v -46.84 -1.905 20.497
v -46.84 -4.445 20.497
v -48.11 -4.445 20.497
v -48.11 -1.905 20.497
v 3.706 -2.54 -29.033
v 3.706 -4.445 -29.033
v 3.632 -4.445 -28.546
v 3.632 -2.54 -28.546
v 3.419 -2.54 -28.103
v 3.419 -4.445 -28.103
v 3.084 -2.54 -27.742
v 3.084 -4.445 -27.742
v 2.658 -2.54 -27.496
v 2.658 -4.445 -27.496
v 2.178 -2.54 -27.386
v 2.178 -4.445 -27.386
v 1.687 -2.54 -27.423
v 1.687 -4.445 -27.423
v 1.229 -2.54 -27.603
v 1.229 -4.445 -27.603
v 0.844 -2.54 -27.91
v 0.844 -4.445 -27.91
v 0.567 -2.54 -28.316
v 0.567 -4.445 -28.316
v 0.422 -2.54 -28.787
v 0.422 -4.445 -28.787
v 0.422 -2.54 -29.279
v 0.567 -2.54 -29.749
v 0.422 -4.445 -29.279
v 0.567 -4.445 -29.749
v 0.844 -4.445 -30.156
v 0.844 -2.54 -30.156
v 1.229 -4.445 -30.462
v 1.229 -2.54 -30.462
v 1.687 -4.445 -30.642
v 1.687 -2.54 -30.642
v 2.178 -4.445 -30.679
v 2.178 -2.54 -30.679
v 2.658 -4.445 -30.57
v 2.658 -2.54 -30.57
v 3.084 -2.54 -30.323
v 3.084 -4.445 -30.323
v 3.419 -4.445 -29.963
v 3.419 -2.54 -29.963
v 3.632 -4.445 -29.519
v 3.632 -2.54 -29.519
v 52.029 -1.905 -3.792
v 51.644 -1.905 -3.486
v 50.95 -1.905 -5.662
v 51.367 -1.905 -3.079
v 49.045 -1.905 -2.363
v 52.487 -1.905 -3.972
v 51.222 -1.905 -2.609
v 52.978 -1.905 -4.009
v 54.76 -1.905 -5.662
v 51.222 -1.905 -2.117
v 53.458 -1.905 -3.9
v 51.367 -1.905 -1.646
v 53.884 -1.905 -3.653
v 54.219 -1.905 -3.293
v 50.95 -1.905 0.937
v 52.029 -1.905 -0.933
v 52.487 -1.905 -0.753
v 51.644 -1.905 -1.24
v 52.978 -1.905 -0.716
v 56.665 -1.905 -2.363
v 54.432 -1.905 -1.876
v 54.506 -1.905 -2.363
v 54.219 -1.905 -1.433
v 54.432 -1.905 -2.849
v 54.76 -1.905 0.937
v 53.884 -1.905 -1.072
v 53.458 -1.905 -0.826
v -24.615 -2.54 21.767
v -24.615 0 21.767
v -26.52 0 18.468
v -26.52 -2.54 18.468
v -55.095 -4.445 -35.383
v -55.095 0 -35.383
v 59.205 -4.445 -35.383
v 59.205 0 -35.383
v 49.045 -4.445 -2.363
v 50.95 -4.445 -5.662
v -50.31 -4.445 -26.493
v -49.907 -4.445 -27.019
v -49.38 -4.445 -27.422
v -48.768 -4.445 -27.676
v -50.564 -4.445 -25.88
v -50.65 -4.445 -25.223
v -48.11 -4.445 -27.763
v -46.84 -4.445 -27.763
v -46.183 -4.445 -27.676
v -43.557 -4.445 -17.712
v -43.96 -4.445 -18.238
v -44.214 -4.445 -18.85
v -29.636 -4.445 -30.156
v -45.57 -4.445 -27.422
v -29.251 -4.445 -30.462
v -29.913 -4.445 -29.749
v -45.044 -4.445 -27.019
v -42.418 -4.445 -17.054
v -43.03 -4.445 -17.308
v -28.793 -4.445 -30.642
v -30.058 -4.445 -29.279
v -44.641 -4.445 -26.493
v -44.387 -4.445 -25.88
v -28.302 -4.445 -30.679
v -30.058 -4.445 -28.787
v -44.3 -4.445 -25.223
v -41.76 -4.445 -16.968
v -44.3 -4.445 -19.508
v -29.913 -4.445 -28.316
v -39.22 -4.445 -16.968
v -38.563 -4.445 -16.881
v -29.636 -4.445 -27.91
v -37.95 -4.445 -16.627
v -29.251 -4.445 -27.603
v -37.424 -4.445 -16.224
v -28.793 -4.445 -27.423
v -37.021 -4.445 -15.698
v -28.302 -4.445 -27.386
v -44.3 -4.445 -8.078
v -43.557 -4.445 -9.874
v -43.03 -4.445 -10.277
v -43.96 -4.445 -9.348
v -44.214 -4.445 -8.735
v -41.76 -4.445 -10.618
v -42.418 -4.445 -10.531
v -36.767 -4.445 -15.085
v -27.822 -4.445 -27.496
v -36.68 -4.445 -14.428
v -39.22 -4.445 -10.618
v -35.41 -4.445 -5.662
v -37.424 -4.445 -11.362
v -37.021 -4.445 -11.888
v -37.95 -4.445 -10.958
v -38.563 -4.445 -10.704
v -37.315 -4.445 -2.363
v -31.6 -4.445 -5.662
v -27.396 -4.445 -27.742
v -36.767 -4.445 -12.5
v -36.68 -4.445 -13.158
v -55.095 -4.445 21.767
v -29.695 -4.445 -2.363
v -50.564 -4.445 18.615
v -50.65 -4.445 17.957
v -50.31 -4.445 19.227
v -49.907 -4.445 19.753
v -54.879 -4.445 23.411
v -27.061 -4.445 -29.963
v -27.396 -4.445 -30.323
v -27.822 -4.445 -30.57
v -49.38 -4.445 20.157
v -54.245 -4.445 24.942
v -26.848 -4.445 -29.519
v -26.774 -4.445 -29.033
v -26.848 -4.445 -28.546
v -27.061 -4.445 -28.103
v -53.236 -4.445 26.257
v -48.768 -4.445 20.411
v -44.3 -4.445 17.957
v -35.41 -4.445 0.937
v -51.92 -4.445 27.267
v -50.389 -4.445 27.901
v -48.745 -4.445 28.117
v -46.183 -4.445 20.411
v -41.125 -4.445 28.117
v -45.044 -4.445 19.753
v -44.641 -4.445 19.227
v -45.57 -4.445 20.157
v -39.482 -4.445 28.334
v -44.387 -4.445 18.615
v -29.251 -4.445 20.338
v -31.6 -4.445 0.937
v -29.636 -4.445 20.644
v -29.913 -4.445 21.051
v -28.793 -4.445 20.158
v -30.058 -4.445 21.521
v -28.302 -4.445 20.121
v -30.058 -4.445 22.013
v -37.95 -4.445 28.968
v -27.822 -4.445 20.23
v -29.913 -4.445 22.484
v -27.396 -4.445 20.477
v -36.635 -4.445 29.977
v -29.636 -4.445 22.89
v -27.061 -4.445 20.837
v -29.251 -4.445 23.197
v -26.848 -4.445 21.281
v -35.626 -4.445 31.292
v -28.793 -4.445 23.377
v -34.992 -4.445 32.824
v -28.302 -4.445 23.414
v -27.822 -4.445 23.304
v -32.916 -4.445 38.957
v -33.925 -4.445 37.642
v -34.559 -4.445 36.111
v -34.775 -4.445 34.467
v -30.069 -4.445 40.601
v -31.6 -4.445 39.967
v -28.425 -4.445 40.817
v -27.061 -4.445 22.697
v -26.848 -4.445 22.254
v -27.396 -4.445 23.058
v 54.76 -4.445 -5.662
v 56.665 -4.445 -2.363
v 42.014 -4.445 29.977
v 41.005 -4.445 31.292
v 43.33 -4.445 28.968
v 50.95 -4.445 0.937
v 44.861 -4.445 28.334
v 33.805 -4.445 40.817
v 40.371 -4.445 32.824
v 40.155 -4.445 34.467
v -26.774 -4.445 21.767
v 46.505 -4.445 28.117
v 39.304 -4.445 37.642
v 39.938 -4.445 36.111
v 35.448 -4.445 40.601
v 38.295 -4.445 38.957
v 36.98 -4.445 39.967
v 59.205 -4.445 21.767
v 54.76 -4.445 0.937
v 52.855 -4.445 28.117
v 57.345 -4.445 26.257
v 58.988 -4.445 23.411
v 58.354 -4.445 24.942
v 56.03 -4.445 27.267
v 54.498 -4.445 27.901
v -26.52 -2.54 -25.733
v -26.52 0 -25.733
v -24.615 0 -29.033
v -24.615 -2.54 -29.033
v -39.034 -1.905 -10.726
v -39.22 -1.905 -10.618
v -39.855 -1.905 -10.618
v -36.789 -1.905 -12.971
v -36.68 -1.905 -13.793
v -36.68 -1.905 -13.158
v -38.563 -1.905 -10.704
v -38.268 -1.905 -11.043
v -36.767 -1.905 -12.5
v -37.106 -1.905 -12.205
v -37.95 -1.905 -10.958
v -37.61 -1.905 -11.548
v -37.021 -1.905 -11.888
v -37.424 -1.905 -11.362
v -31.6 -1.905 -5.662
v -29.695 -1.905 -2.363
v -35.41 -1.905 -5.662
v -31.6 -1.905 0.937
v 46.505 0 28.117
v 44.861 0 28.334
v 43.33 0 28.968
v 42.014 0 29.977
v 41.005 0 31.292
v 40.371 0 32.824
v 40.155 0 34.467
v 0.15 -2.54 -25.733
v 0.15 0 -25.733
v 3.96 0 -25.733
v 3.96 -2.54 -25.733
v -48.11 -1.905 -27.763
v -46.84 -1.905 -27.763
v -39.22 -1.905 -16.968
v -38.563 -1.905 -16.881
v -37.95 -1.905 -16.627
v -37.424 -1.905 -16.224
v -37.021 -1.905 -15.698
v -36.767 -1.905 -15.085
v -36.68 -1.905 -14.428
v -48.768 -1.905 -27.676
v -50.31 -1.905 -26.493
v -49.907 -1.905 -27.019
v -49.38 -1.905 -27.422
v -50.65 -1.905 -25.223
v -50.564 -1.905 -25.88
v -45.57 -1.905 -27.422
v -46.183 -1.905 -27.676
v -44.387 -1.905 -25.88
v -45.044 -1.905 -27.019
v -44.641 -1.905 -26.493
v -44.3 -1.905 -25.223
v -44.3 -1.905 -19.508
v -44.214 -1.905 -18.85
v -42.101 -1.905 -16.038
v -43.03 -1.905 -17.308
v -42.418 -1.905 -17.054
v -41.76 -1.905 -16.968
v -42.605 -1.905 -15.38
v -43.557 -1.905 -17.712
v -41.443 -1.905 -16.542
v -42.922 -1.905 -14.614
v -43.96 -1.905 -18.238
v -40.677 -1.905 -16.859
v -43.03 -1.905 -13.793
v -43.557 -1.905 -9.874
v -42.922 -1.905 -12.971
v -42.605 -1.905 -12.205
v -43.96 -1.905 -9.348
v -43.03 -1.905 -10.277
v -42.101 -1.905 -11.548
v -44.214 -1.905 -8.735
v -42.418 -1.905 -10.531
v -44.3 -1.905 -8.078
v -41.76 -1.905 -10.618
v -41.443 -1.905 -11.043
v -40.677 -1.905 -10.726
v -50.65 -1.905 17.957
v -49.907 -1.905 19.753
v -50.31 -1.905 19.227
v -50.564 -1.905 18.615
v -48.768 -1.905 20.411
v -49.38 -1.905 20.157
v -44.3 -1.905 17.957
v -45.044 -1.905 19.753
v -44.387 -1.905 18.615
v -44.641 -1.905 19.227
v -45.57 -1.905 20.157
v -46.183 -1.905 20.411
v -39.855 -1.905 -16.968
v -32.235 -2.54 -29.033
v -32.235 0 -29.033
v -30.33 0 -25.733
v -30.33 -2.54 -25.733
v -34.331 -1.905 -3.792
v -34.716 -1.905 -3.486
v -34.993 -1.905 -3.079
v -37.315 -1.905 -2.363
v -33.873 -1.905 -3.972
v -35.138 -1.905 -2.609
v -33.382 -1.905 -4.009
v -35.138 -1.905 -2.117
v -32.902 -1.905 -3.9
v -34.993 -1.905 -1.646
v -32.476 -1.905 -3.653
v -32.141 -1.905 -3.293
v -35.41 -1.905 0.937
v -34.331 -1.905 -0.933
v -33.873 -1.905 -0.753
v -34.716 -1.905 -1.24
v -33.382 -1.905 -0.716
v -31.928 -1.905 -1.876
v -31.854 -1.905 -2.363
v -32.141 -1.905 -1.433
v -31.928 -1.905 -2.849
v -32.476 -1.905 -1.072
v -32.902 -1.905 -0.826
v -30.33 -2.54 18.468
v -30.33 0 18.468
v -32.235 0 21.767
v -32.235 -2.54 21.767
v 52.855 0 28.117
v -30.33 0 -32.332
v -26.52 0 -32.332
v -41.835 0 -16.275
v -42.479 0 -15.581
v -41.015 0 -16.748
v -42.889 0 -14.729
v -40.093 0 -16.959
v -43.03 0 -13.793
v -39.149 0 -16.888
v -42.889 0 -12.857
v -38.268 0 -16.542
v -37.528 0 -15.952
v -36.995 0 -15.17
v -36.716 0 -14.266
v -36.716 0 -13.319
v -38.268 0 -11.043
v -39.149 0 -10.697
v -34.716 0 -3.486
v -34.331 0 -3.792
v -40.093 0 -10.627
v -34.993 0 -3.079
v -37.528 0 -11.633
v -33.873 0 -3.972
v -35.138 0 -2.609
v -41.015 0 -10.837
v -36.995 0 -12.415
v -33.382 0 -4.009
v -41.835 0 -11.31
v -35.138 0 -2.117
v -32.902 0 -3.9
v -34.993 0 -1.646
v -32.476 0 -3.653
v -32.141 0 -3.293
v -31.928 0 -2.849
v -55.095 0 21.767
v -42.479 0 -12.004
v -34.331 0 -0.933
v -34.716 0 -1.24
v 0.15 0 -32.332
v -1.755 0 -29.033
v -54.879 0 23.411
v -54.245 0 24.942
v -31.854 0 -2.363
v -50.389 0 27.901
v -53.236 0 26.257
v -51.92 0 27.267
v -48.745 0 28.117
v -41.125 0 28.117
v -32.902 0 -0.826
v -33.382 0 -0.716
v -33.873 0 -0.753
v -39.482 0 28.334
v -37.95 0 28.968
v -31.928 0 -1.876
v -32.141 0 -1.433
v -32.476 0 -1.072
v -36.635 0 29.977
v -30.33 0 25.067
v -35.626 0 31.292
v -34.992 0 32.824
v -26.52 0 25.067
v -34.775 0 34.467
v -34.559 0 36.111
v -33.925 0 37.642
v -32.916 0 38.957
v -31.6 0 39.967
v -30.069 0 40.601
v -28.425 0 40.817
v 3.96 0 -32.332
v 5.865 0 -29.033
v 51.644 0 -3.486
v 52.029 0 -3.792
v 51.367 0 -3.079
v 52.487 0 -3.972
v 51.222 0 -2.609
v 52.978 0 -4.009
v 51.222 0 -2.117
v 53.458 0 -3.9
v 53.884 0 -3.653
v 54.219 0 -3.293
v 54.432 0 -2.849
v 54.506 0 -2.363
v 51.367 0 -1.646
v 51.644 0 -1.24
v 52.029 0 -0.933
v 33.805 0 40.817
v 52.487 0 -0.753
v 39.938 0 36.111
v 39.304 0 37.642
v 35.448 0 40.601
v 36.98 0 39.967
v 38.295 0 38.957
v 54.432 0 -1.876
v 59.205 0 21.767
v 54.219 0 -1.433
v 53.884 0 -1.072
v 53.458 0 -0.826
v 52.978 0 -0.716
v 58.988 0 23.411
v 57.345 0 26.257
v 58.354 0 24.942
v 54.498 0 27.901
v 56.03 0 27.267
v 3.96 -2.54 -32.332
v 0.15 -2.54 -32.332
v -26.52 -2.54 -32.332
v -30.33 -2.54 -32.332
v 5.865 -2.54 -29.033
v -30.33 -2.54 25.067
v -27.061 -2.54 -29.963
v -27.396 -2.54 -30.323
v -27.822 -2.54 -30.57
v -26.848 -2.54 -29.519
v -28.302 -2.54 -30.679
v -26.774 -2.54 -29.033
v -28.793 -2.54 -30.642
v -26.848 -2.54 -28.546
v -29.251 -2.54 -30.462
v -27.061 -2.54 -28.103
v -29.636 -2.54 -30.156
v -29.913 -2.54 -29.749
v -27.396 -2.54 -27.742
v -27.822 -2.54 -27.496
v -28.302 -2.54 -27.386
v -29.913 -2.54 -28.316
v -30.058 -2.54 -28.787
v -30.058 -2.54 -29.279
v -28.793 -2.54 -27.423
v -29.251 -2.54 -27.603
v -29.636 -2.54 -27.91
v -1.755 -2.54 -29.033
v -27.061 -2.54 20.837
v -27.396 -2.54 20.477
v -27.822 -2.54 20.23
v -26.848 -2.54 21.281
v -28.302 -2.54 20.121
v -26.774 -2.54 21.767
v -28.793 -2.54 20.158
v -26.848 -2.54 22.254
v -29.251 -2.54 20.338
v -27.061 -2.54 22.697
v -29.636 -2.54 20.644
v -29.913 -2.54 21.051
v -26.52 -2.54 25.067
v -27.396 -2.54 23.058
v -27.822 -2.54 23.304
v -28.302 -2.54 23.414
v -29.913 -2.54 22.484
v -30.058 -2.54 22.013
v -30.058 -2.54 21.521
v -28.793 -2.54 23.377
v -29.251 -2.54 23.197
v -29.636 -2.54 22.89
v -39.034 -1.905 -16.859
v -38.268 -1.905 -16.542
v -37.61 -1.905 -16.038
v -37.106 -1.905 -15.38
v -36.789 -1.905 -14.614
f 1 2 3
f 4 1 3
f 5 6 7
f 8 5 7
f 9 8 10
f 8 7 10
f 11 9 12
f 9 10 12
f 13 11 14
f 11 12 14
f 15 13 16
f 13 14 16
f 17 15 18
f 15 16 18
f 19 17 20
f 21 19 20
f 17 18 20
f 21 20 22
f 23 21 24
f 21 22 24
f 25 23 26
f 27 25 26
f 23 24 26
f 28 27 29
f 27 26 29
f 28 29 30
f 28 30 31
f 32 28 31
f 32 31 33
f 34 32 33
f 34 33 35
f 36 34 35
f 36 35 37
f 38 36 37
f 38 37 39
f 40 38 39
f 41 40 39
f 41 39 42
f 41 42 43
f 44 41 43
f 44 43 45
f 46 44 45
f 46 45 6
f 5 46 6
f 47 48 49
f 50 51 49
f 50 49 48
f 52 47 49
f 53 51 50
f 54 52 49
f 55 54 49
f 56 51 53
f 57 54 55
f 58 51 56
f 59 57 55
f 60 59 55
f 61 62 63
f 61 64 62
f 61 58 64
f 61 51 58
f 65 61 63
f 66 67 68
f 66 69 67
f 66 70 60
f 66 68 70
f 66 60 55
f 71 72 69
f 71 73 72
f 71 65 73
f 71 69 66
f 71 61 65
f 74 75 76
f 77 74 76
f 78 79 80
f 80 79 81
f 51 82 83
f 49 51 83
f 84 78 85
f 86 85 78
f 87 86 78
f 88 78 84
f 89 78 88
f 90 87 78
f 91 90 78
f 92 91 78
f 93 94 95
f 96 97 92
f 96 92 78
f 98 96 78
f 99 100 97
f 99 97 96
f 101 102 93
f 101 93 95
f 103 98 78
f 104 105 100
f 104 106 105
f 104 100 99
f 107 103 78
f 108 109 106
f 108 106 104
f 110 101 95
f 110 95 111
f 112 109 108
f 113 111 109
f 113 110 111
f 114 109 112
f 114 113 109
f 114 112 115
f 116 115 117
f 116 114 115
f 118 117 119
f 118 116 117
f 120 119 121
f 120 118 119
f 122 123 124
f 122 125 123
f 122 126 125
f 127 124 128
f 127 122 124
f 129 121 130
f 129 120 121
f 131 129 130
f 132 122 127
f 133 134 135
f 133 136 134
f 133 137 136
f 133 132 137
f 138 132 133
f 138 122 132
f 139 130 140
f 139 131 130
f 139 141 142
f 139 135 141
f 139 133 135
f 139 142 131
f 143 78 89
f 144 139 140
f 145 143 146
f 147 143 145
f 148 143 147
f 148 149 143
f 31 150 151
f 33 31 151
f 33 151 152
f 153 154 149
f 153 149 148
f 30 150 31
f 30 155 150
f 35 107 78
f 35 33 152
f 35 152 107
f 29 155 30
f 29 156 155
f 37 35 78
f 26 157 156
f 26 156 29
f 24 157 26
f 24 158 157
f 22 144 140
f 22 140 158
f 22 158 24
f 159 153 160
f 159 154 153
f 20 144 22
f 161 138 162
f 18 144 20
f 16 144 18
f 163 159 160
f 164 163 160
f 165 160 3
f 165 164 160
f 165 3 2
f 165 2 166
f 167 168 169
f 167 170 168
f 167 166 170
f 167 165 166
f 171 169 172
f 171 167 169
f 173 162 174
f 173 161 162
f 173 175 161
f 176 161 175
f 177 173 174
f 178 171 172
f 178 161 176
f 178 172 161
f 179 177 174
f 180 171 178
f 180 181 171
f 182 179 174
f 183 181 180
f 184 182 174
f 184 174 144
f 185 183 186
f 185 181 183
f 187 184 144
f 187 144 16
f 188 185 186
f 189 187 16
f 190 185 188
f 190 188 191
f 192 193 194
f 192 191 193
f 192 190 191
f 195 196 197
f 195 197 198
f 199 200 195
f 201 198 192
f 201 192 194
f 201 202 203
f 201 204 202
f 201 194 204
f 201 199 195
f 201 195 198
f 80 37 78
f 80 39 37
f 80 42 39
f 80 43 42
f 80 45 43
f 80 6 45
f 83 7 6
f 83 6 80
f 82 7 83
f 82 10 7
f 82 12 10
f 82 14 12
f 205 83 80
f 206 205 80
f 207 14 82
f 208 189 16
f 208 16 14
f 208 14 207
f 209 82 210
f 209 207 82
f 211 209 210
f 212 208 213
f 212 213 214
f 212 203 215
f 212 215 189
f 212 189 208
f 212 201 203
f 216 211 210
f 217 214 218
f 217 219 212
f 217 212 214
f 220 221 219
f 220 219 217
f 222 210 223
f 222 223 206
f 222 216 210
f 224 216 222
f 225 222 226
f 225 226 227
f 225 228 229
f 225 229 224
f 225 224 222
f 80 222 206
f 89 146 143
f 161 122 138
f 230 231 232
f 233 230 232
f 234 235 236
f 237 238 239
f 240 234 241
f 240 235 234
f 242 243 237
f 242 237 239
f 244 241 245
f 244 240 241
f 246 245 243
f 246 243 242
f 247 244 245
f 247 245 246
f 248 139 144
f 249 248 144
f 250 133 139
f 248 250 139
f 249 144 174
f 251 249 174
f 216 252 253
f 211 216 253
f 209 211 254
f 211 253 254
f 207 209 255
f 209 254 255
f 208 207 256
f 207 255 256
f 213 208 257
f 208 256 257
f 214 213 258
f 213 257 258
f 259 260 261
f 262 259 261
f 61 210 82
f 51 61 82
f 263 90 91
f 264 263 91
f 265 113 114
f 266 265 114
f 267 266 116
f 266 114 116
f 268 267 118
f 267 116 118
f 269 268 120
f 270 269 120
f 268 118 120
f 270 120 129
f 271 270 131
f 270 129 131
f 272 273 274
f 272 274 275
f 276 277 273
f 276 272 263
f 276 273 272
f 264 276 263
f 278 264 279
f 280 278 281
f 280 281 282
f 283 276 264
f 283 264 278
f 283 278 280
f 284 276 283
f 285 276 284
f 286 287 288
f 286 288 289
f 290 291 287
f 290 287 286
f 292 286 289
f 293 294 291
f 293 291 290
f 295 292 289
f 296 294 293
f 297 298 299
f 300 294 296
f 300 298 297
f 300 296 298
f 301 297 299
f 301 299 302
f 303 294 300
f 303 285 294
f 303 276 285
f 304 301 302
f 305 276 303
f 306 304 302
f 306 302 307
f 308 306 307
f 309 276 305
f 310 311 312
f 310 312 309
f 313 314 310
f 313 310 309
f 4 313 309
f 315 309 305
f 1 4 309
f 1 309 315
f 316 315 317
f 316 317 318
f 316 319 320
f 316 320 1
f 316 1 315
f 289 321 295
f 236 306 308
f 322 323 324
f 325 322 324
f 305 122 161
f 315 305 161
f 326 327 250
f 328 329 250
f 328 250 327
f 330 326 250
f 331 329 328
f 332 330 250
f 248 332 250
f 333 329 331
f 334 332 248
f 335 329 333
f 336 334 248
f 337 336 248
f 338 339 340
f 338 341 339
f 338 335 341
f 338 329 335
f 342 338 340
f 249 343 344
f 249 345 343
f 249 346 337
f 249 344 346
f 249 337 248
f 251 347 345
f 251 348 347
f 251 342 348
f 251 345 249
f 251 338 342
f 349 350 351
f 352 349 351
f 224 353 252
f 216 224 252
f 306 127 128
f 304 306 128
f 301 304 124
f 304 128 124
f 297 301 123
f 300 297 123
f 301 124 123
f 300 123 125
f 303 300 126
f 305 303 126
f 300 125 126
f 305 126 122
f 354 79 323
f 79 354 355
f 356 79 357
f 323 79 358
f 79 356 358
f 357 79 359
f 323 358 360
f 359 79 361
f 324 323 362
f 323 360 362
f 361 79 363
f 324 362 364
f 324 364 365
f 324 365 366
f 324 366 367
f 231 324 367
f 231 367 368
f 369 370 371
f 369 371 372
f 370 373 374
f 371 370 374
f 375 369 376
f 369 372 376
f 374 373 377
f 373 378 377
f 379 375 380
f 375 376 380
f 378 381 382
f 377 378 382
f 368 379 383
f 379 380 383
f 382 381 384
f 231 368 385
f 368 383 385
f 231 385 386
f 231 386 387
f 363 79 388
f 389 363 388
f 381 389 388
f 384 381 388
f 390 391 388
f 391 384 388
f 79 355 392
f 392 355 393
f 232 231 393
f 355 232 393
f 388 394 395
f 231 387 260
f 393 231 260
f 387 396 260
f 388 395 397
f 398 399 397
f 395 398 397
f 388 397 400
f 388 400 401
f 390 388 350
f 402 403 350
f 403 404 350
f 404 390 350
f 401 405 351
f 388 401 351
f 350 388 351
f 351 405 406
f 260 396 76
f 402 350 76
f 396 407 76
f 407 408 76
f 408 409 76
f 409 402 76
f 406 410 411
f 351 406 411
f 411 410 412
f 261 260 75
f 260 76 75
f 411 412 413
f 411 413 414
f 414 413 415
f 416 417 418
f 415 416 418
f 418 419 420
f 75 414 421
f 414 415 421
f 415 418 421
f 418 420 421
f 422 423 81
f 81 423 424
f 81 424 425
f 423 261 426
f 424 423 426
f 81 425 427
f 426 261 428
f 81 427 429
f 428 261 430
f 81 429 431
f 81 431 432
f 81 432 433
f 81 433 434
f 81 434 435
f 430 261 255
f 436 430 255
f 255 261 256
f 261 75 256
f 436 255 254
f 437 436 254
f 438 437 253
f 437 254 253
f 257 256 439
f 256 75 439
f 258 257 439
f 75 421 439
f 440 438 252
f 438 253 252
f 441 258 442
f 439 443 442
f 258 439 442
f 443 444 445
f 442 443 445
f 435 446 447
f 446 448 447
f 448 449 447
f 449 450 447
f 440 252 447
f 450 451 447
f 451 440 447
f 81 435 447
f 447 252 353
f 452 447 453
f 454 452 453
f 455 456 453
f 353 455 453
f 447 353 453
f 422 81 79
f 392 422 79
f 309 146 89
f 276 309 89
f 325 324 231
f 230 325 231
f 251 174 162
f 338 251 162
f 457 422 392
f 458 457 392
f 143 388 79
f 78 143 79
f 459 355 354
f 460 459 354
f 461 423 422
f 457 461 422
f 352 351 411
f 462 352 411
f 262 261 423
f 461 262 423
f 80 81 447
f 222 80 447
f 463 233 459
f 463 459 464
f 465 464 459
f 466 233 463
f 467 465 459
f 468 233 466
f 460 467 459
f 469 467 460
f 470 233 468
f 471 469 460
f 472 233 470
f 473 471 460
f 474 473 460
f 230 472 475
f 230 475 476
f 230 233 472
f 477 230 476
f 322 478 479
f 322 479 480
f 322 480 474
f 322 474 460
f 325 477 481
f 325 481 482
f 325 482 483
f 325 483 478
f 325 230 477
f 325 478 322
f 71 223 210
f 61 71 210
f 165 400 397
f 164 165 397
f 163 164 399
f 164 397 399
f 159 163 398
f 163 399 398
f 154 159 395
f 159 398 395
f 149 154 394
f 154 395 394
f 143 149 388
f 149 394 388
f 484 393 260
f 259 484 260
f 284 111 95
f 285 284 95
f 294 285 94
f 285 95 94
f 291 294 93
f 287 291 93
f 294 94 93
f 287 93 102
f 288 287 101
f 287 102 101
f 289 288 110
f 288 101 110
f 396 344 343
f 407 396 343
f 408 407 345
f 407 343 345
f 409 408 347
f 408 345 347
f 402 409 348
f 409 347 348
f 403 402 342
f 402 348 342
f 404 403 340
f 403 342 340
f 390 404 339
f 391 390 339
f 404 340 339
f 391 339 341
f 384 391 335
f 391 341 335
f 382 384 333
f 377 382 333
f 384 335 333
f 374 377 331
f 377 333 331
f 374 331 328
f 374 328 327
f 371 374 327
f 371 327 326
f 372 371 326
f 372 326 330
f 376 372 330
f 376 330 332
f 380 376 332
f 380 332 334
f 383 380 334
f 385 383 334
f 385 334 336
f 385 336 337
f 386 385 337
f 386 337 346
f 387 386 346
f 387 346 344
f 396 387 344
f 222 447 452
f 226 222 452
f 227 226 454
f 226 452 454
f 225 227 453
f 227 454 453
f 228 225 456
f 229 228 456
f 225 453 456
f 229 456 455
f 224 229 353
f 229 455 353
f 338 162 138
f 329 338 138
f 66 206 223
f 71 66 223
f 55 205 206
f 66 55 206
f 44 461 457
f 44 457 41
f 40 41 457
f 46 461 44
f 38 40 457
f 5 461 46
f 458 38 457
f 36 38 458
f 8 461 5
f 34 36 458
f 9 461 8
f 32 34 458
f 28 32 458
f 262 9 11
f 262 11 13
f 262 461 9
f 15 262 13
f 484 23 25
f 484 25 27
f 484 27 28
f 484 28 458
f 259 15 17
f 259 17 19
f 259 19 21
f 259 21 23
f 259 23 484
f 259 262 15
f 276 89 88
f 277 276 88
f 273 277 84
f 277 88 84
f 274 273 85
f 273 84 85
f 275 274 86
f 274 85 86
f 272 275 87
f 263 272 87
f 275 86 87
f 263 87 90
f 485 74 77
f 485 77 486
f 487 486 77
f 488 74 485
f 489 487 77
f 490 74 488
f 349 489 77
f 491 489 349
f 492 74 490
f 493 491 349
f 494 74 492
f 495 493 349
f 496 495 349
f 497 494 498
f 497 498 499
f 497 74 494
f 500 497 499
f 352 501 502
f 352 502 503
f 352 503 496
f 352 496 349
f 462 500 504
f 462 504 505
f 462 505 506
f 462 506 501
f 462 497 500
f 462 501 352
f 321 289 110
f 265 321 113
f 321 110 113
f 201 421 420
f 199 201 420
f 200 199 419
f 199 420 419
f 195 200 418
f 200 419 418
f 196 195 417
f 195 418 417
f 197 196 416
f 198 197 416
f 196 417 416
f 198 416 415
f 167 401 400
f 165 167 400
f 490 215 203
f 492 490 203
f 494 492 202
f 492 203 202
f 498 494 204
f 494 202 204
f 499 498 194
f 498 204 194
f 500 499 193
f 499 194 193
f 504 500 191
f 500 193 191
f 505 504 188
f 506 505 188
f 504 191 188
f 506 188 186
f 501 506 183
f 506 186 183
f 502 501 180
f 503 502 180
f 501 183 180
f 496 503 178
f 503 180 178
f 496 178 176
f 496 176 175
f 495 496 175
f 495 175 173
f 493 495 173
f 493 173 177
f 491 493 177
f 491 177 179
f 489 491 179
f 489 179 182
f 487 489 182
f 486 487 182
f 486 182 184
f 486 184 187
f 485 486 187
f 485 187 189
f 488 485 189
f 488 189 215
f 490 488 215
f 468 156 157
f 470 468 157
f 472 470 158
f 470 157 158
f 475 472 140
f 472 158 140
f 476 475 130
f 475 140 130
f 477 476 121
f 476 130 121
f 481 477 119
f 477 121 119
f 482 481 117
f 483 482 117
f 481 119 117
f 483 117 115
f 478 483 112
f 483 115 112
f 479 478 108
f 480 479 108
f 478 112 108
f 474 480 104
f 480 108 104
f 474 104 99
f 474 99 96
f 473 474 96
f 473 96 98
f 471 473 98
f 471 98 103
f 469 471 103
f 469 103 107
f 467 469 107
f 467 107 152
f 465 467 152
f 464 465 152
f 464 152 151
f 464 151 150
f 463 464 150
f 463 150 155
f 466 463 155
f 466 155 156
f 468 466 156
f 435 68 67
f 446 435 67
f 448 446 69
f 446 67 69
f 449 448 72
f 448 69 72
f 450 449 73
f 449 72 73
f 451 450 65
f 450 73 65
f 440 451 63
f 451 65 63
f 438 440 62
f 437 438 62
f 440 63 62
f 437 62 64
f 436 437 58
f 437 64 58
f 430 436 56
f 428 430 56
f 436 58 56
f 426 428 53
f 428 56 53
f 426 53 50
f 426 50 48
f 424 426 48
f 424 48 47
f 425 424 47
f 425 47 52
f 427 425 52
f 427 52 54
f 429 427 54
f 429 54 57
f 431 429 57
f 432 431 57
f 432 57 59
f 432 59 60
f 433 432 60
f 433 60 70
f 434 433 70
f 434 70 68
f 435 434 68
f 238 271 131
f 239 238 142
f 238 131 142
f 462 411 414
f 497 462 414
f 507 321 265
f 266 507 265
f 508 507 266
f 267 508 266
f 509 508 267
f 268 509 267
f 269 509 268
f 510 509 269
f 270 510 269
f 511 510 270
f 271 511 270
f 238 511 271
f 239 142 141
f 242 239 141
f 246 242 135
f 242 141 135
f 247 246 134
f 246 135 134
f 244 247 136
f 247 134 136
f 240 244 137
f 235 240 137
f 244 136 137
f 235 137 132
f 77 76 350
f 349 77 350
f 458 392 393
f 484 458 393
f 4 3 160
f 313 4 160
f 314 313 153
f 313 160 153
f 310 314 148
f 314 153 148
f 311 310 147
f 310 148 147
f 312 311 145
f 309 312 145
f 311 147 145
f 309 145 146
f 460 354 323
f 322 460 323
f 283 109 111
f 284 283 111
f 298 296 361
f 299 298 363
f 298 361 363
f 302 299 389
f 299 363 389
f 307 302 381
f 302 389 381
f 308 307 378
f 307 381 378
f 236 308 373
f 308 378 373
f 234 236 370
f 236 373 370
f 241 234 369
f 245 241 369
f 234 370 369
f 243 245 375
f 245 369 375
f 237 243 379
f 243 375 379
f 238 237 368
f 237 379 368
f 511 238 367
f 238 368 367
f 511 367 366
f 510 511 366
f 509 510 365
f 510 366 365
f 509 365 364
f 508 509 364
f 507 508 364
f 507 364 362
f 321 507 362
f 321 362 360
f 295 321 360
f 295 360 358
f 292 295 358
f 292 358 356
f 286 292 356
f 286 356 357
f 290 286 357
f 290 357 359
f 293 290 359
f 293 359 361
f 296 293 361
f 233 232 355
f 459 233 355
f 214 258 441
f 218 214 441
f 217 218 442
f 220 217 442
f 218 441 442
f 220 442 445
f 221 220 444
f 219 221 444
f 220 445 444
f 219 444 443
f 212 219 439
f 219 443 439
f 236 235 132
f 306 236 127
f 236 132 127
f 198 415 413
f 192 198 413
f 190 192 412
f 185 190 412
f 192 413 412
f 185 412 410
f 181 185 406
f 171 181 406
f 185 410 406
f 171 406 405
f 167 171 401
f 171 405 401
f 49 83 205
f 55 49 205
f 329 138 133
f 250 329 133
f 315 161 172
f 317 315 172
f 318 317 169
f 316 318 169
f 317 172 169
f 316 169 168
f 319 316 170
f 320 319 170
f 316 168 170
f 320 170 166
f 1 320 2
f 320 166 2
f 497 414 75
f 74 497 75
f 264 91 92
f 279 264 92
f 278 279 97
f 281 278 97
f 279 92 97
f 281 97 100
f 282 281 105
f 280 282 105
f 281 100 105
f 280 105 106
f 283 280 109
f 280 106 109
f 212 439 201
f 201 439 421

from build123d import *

# Parameters (mm, degrees)
F1_DEPTH  = 4.445
F2_R      = 1.651
F3_DEPTH  = 4.446
F4_R      = 1.651
F5_DEPTH  = 4.446
F7_DEPTH  = 2.54
F9_DEPTH  = 2.54
F10_R     = 3.175
F11_DEPTH = 4.446
F13_DEPTH = 2.54


with BuildPart() as f1:
    # F0 (on Front) → F1 (new body)
    with BuildSketch(Plane.XZ):
        with BuildLine():
            Line((33.804538, 40.817322), (-28.425462, 40.817322))
            ThreePointArc((-28.425462, 40.817322), (-32.91559, 38.95745), (-34.775462, 34.467322))
            ThreePointArc((-34.775462, 34.467322), (-36.635334, 29.977194), (-41.125462, 28.117322))
            Line((-41.125462, 28.117322), (-48.745462, 28.117322))
            ThreePointArc((-48.745462, 28.117322), (-53.23559, 26.25745), (-55.095462, 21.767322))
            Line((-55.095462, 21.767322), (-55.095462, -35.382678))
            Line((-55.095462, -35.382678), (59.204538, -35.382678))
            Line((59.204538, -35.382678), (59.204538, 21.767322))
            ThreePointArc((59.204538, 21.767322), (57.344666, 26.25745), (52.854538, 28.117322))
            Line((52.854538, 28.117322), (46.504538, 28.117322))
            ThreePointArc((46.504538, 28.117322), (42.01441, 29.977194), (40.154538, 34.467322))
            ThreePointArc((40.154538, 34.467322), (38.294666, 38.95745), (33.804538, 40.817322))
        make_face()
    extrude(amount=F1_DEPTH)

    # F2 (on face) → F3 (cut, through all)
    with BuildSketch(Plane.XZ.offset(4.445)):
        with Locations((-28.425462, -29.032678)):
            Circle(F2_R)
        with Locations((2.054538, -29.032678)):
            Circle(F2_R)
        with Locations((-28.425462, 21.767322)):
            Circle(F2_R)
    extrude(amount=-F3_DEPTH, mode=Mode.SUBTRACT)

    # F4 (on face) → F5 (cut, through all)
    with BuildSketch(Plane.XZ.offset(4.445)):
        with Locations((-33.505462, -2.362678)):
            Circle(F4_R)
        with Locations((52.854538, -2.362678)):
            Circle(F4_R)
    extrude(amount=-F5_DEPTH, mode=Mode.SUBTRACT)

    # F6 (on face) → F7 (cut)
    with BuildSketch(Plane.XZ.offset(4.445)):
        Polygon((-29.695462, -2.362678), (-31.600462, 0.936879), (-35.410462, 0.936879), (-37.315462, -2.362678), (-35.410462, -5.662235), (-31.600462, -5.662235), align=None)
        Polygon((54.759538, 0.936879), (50.949538, 0.936879), (49.044538, -2.362678), (50.949538, -5.662235), (54.759538, -5.662235), (56.664538, -2.362678), align=None)
    extrude(amount=-F7_DEPTH, mode=Mode.SUBTRACT)

    # F8 (on face) → F9 (cut)
    with BuildSketch(Plane(origin=(0, 0, 0), x_dir=(-1, 0, 0), z_dir=(0, 1, 0))):
        Polygon((30.330462, 18.467765), (32.235462, 21.767322), (30.330462, 25.066879), (26.520462, 25.066879), (24.615462, 21.767322), (26.520462, 18.467765), align=None)
        Polygon((32.235462, -29.032678), (30.330462, -25.733121), (26.520462, -25.733121), (24.615462, -29.032678), (26.520462, -32.332235), (30.330462, -32.332235), align=None)
        Polygon((-0.149538, -25.733121), (-3.959538, -25.733121), (-5.864538, -29.032678), (-3.959538, -32.332235), (-0.149538, -32.332235), (1.755462, -29.032678), align=None)
    extrude(amount=-F9_DEPTH, mode=Mode.SUBTRACT)

    # F10 (on face) → F11 (cut, through all)
    with BuildSketch(Plane(origin=(0, 0, 0), x_dir=(-1, 0, 0), z_dir=(0, 1, 0))):
        with Locations((39.855462, -13.792678)):
            Circle(F10_R)
    extrude(amount=-F11_DEPTH, mode=Mode.SUBTRACT)

    # F12 (on face) → F13 (cut)
    with BuildSketch(Plane.XZ.offset(4.445)):
        with BuildLine():
            Line((-46.840462, 20.497322), (-48.110462, 20.497322))
            ThreePointArc((-48.110462, 20.497322), (-49.906513, 19.753373), (-50.650462, 17.957322))
            Line((-50.650462, 17.957322), (-50.650462, -10.617678))
            Line((-50.650462, -10.617678), (-50.650462, -16.967678))
            Line((-50.650462, -16.967678), (-50.650462, -25.222678))
            ThreePointArc((-50.650462, -25.222678), (-49.906513, -27.018729), (-48.110462, -27.762678))
            Line((-48.110462, -27.762678), (-46.840462, -27.762678))
            ThreePointArc((-46.840462, -27.762678), (-45.044411, -27.018729), (-44.300462, -25.222678))
            Line((-44.300462, -25.222678), (-44.300462, -19.507678))
            ThreePointArc((-44.300462, -19.507678), (-43.556513, -17.711627), (-41.760462, -16.967678))
            Line((-41.760462, -16.967678), (-39.220462, -16.967678))
            ThreePointArc((-39.220462, -16.967678), (-37.424411, -16.223729), (-36.680462, -14.427678))
            Line((-36.680462, -14.427678), (-36.680462, -13.157678))
            ThreePointArc((-36.680462, -13.157678), (-37.424411, -11.361627), (-39.220462, -10.617678))
            Line((-39.220462, -10.617678), (-41.760462, -10.617678))
            ThreePointArc((-41.760462, -10.617678), (-43.556513, -9.873729), (-44.300462, -8.077678))
            Line((-44.300462, -8.077678), (-44.300462, 17.957322))
            ThreePointArc((-44.300462, 17.957322), (-45.044411, 19.753373), (-46.840462, 20.497322))
        make_face()
    extrude(amount=-F13_DEPTH, mode=Mode.SUBTRACT)


solid = f1.part
